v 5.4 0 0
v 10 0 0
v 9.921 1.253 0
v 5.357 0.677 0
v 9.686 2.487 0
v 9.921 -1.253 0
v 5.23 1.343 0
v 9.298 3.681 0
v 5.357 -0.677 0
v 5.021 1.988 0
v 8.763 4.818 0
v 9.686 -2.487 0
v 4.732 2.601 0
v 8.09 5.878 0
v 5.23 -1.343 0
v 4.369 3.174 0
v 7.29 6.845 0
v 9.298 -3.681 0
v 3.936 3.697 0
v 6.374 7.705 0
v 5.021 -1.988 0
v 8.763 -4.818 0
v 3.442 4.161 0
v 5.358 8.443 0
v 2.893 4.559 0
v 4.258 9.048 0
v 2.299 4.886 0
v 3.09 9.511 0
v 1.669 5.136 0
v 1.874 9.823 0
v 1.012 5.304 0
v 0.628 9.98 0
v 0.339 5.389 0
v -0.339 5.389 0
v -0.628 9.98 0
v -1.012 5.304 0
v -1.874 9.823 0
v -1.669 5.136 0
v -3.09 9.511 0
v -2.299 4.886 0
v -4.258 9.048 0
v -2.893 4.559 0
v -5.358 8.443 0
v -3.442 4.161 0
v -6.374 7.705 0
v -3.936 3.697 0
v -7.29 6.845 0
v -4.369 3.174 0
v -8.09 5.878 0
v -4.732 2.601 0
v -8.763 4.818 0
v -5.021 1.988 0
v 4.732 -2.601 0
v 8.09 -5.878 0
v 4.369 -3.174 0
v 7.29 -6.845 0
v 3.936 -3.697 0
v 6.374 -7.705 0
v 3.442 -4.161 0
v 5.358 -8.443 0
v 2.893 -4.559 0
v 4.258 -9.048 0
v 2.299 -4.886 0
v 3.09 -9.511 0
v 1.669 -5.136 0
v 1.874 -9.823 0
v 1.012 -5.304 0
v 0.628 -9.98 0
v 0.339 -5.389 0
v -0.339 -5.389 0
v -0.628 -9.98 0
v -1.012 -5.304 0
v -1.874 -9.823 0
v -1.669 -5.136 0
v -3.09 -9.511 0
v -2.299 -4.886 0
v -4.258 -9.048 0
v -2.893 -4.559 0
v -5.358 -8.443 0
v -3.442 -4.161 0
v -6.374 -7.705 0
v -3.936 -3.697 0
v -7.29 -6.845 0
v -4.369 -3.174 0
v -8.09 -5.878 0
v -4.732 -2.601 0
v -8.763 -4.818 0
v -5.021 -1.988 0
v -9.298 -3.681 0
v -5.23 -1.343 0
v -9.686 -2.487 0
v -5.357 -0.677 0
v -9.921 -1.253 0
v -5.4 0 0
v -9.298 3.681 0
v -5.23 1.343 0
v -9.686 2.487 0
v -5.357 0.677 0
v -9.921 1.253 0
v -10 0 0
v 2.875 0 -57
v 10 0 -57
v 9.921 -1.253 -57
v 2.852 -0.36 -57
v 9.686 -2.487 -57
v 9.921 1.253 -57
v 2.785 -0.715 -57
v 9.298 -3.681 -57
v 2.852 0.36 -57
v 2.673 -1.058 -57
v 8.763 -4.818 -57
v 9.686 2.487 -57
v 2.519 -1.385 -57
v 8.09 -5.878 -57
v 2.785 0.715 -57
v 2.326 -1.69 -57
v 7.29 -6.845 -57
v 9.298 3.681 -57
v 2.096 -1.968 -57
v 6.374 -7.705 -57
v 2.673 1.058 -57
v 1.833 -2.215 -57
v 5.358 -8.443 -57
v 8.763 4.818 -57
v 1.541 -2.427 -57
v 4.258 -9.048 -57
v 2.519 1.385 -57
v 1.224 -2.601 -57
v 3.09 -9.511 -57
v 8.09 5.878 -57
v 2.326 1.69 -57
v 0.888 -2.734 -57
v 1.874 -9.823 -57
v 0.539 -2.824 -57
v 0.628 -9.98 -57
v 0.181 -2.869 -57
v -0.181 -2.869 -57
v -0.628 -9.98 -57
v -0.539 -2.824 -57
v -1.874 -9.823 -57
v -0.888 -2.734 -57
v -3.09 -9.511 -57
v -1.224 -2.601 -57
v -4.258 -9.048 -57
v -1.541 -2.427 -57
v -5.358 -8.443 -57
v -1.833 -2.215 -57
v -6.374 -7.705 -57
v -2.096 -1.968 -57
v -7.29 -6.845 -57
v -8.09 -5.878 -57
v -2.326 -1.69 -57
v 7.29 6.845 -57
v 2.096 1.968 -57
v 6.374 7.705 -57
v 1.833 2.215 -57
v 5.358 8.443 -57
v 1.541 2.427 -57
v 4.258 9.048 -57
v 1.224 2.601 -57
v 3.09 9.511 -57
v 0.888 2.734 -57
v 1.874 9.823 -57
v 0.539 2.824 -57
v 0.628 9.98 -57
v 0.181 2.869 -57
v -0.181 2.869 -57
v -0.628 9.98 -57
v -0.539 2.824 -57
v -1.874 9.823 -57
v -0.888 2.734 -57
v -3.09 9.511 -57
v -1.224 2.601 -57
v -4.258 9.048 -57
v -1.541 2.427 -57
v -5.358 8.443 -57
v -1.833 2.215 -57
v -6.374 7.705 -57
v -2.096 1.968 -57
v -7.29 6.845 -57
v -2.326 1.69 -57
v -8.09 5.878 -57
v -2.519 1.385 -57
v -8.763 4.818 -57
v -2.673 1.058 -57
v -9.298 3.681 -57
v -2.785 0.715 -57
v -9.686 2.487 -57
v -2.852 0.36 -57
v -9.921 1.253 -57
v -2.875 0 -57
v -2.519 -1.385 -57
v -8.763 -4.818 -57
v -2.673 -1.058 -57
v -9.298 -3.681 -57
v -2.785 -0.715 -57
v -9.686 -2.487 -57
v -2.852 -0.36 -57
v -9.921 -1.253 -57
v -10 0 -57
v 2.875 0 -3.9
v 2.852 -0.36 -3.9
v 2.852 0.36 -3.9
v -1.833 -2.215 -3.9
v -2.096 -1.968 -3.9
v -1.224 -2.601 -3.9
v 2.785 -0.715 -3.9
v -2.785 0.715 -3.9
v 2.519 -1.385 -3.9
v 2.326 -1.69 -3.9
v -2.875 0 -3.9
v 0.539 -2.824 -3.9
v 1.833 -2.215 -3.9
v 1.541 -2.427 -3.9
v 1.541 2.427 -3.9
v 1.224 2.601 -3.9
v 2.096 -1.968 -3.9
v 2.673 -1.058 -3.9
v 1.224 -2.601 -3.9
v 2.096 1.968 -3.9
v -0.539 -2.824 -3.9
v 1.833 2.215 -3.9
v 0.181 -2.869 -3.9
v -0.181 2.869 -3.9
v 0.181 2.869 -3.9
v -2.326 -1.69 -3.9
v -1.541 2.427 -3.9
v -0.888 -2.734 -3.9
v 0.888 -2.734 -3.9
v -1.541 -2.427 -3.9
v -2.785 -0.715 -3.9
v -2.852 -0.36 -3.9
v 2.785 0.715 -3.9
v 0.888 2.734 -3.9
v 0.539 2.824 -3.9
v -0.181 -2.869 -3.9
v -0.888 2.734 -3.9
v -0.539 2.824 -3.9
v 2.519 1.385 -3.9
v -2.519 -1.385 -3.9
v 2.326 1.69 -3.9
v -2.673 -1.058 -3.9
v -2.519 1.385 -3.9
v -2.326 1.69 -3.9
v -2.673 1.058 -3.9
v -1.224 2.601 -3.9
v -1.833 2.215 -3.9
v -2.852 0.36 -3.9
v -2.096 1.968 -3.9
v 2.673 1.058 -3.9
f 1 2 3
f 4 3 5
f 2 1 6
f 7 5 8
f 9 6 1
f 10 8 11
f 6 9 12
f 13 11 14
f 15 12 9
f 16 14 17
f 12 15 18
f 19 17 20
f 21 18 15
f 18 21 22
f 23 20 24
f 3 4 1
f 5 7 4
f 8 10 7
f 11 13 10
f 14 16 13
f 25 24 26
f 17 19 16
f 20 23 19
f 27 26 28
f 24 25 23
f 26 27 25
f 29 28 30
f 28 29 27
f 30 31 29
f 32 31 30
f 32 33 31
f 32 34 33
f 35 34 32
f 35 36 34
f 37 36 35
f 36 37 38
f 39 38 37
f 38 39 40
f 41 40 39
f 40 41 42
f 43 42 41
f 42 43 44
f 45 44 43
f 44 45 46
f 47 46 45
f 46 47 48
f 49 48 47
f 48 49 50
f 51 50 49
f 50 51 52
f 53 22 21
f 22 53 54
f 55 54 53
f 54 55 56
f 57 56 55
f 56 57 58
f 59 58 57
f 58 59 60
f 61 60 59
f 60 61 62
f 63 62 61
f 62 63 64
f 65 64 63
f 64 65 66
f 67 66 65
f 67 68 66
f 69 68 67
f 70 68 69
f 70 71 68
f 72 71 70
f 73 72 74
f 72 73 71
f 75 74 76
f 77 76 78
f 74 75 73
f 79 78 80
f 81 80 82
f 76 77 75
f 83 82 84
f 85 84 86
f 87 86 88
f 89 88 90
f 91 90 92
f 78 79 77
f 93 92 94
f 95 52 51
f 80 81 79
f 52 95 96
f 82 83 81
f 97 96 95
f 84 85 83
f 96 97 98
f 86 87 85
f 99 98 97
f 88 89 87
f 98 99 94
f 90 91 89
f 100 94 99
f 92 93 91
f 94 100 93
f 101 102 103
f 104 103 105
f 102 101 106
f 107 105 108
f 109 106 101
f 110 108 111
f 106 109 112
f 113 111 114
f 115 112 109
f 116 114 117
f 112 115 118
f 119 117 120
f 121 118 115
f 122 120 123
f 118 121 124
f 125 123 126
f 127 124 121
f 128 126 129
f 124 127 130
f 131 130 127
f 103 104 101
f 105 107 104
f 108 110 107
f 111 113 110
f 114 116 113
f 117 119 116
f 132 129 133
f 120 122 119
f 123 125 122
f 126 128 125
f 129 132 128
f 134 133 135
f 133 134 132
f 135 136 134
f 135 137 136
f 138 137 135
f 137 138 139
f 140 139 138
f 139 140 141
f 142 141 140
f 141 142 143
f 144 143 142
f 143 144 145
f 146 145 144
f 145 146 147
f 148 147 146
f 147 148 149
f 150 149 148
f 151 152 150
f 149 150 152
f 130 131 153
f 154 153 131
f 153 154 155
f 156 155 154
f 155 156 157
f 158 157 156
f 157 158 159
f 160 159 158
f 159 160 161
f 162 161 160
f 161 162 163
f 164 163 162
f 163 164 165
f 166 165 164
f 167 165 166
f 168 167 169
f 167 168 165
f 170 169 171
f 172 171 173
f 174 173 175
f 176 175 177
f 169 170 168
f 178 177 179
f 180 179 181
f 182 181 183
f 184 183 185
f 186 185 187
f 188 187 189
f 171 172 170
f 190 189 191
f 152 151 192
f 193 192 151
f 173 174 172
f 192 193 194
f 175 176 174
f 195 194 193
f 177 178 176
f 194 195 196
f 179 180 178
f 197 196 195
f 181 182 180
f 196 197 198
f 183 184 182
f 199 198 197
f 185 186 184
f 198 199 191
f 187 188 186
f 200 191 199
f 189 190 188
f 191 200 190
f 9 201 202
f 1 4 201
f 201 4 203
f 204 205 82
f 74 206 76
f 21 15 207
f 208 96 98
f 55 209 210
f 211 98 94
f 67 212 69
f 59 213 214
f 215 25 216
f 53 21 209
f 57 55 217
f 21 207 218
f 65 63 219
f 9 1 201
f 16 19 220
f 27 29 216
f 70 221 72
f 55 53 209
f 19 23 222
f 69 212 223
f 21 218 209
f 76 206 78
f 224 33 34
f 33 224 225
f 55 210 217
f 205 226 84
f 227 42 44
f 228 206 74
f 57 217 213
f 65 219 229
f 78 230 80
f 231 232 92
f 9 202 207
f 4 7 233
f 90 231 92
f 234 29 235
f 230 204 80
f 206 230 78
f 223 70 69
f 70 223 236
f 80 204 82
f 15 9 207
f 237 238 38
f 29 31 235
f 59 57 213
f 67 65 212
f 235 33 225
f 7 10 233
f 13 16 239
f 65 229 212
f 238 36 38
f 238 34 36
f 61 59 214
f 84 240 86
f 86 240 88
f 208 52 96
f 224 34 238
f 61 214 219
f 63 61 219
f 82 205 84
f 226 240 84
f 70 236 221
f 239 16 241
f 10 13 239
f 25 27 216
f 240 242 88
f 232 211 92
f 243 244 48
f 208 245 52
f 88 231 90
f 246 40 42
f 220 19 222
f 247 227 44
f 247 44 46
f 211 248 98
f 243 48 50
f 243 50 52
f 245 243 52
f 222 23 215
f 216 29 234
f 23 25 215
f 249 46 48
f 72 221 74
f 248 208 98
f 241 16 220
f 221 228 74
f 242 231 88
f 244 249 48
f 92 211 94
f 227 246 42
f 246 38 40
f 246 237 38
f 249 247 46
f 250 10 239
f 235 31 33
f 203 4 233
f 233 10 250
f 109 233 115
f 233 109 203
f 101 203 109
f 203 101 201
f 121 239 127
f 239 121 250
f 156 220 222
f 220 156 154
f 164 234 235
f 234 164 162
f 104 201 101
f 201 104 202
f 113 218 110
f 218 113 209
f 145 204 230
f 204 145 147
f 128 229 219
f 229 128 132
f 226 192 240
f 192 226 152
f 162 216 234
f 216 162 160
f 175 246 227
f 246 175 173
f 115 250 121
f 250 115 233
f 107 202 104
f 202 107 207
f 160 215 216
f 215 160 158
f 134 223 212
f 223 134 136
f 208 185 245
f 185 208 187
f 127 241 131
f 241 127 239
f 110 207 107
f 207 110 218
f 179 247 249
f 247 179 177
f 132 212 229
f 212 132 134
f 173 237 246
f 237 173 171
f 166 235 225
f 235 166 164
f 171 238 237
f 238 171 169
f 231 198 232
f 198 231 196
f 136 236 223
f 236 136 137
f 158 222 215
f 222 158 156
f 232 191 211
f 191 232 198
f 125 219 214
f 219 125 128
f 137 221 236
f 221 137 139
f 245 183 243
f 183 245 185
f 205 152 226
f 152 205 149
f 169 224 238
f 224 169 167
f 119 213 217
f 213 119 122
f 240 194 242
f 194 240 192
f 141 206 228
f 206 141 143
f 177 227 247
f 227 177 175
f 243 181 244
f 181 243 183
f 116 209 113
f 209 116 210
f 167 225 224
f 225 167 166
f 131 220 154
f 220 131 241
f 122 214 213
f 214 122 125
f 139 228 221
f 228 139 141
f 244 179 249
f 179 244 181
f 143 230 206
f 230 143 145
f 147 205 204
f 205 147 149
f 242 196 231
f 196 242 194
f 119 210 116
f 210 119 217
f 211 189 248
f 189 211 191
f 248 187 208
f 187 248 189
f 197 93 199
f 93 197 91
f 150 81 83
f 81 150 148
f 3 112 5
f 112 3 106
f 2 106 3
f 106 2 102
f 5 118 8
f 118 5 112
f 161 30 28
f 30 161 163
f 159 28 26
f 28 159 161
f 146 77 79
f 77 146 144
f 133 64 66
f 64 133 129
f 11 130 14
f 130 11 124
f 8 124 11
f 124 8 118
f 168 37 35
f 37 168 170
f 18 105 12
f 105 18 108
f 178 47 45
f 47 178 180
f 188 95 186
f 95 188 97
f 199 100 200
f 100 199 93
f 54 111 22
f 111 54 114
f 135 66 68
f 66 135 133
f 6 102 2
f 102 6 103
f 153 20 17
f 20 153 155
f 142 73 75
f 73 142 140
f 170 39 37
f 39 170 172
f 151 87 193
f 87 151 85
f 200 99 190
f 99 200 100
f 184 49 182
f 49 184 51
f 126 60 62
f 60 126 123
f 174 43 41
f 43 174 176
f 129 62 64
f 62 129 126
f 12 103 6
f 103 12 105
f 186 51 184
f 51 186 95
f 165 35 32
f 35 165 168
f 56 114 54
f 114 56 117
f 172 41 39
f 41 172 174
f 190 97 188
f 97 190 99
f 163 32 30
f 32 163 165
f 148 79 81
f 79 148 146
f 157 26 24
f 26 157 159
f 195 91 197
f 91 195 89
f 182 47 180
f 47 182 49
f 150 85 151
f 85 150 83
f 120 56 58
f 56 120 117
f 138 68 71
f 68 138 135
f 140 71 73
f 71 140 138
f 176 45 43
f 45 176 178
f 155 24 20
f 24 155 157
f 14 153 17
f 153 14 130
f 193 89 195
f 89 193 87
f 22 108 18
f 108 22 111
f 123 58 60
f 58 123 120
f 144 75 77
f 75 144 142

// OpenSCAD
$fn = 50;


difference() {
	union() {
		translate(v = [0, 0, -57.0000000000]) {
			cylinder(h = 57, r = 10.0000000000);
		}
		cylinder(h = 0, r = 16.0000000000);
	}
	union() {
		translate(v = [0, 0, 0]) {
			rotate(a = [0, 0, 0]) {
				difference() {
					union() {
						#translate(v = [0, 0, -57.0000000000]) {
							cylinder(h = 57, r = 2.6000000000);
						}
						#translate(v = [0, 0, -3.9000000000]) {
							cylinder(h = 3.9000000000, r = 10.0000000000, r1 = 2.8750000000, r2 = 5.4000000000);
						}
						#translate(v = [0, 0, -57.0000000000]) {
							cylinder(h = 57, r = 2.8750000000);
						}
						#translate(v = [0, 0, -57.0000000000]) {
							cylinder(h = 57, r = 2.6000000000);
						}
					}
					union();
				}
			}
		}
	}
}
